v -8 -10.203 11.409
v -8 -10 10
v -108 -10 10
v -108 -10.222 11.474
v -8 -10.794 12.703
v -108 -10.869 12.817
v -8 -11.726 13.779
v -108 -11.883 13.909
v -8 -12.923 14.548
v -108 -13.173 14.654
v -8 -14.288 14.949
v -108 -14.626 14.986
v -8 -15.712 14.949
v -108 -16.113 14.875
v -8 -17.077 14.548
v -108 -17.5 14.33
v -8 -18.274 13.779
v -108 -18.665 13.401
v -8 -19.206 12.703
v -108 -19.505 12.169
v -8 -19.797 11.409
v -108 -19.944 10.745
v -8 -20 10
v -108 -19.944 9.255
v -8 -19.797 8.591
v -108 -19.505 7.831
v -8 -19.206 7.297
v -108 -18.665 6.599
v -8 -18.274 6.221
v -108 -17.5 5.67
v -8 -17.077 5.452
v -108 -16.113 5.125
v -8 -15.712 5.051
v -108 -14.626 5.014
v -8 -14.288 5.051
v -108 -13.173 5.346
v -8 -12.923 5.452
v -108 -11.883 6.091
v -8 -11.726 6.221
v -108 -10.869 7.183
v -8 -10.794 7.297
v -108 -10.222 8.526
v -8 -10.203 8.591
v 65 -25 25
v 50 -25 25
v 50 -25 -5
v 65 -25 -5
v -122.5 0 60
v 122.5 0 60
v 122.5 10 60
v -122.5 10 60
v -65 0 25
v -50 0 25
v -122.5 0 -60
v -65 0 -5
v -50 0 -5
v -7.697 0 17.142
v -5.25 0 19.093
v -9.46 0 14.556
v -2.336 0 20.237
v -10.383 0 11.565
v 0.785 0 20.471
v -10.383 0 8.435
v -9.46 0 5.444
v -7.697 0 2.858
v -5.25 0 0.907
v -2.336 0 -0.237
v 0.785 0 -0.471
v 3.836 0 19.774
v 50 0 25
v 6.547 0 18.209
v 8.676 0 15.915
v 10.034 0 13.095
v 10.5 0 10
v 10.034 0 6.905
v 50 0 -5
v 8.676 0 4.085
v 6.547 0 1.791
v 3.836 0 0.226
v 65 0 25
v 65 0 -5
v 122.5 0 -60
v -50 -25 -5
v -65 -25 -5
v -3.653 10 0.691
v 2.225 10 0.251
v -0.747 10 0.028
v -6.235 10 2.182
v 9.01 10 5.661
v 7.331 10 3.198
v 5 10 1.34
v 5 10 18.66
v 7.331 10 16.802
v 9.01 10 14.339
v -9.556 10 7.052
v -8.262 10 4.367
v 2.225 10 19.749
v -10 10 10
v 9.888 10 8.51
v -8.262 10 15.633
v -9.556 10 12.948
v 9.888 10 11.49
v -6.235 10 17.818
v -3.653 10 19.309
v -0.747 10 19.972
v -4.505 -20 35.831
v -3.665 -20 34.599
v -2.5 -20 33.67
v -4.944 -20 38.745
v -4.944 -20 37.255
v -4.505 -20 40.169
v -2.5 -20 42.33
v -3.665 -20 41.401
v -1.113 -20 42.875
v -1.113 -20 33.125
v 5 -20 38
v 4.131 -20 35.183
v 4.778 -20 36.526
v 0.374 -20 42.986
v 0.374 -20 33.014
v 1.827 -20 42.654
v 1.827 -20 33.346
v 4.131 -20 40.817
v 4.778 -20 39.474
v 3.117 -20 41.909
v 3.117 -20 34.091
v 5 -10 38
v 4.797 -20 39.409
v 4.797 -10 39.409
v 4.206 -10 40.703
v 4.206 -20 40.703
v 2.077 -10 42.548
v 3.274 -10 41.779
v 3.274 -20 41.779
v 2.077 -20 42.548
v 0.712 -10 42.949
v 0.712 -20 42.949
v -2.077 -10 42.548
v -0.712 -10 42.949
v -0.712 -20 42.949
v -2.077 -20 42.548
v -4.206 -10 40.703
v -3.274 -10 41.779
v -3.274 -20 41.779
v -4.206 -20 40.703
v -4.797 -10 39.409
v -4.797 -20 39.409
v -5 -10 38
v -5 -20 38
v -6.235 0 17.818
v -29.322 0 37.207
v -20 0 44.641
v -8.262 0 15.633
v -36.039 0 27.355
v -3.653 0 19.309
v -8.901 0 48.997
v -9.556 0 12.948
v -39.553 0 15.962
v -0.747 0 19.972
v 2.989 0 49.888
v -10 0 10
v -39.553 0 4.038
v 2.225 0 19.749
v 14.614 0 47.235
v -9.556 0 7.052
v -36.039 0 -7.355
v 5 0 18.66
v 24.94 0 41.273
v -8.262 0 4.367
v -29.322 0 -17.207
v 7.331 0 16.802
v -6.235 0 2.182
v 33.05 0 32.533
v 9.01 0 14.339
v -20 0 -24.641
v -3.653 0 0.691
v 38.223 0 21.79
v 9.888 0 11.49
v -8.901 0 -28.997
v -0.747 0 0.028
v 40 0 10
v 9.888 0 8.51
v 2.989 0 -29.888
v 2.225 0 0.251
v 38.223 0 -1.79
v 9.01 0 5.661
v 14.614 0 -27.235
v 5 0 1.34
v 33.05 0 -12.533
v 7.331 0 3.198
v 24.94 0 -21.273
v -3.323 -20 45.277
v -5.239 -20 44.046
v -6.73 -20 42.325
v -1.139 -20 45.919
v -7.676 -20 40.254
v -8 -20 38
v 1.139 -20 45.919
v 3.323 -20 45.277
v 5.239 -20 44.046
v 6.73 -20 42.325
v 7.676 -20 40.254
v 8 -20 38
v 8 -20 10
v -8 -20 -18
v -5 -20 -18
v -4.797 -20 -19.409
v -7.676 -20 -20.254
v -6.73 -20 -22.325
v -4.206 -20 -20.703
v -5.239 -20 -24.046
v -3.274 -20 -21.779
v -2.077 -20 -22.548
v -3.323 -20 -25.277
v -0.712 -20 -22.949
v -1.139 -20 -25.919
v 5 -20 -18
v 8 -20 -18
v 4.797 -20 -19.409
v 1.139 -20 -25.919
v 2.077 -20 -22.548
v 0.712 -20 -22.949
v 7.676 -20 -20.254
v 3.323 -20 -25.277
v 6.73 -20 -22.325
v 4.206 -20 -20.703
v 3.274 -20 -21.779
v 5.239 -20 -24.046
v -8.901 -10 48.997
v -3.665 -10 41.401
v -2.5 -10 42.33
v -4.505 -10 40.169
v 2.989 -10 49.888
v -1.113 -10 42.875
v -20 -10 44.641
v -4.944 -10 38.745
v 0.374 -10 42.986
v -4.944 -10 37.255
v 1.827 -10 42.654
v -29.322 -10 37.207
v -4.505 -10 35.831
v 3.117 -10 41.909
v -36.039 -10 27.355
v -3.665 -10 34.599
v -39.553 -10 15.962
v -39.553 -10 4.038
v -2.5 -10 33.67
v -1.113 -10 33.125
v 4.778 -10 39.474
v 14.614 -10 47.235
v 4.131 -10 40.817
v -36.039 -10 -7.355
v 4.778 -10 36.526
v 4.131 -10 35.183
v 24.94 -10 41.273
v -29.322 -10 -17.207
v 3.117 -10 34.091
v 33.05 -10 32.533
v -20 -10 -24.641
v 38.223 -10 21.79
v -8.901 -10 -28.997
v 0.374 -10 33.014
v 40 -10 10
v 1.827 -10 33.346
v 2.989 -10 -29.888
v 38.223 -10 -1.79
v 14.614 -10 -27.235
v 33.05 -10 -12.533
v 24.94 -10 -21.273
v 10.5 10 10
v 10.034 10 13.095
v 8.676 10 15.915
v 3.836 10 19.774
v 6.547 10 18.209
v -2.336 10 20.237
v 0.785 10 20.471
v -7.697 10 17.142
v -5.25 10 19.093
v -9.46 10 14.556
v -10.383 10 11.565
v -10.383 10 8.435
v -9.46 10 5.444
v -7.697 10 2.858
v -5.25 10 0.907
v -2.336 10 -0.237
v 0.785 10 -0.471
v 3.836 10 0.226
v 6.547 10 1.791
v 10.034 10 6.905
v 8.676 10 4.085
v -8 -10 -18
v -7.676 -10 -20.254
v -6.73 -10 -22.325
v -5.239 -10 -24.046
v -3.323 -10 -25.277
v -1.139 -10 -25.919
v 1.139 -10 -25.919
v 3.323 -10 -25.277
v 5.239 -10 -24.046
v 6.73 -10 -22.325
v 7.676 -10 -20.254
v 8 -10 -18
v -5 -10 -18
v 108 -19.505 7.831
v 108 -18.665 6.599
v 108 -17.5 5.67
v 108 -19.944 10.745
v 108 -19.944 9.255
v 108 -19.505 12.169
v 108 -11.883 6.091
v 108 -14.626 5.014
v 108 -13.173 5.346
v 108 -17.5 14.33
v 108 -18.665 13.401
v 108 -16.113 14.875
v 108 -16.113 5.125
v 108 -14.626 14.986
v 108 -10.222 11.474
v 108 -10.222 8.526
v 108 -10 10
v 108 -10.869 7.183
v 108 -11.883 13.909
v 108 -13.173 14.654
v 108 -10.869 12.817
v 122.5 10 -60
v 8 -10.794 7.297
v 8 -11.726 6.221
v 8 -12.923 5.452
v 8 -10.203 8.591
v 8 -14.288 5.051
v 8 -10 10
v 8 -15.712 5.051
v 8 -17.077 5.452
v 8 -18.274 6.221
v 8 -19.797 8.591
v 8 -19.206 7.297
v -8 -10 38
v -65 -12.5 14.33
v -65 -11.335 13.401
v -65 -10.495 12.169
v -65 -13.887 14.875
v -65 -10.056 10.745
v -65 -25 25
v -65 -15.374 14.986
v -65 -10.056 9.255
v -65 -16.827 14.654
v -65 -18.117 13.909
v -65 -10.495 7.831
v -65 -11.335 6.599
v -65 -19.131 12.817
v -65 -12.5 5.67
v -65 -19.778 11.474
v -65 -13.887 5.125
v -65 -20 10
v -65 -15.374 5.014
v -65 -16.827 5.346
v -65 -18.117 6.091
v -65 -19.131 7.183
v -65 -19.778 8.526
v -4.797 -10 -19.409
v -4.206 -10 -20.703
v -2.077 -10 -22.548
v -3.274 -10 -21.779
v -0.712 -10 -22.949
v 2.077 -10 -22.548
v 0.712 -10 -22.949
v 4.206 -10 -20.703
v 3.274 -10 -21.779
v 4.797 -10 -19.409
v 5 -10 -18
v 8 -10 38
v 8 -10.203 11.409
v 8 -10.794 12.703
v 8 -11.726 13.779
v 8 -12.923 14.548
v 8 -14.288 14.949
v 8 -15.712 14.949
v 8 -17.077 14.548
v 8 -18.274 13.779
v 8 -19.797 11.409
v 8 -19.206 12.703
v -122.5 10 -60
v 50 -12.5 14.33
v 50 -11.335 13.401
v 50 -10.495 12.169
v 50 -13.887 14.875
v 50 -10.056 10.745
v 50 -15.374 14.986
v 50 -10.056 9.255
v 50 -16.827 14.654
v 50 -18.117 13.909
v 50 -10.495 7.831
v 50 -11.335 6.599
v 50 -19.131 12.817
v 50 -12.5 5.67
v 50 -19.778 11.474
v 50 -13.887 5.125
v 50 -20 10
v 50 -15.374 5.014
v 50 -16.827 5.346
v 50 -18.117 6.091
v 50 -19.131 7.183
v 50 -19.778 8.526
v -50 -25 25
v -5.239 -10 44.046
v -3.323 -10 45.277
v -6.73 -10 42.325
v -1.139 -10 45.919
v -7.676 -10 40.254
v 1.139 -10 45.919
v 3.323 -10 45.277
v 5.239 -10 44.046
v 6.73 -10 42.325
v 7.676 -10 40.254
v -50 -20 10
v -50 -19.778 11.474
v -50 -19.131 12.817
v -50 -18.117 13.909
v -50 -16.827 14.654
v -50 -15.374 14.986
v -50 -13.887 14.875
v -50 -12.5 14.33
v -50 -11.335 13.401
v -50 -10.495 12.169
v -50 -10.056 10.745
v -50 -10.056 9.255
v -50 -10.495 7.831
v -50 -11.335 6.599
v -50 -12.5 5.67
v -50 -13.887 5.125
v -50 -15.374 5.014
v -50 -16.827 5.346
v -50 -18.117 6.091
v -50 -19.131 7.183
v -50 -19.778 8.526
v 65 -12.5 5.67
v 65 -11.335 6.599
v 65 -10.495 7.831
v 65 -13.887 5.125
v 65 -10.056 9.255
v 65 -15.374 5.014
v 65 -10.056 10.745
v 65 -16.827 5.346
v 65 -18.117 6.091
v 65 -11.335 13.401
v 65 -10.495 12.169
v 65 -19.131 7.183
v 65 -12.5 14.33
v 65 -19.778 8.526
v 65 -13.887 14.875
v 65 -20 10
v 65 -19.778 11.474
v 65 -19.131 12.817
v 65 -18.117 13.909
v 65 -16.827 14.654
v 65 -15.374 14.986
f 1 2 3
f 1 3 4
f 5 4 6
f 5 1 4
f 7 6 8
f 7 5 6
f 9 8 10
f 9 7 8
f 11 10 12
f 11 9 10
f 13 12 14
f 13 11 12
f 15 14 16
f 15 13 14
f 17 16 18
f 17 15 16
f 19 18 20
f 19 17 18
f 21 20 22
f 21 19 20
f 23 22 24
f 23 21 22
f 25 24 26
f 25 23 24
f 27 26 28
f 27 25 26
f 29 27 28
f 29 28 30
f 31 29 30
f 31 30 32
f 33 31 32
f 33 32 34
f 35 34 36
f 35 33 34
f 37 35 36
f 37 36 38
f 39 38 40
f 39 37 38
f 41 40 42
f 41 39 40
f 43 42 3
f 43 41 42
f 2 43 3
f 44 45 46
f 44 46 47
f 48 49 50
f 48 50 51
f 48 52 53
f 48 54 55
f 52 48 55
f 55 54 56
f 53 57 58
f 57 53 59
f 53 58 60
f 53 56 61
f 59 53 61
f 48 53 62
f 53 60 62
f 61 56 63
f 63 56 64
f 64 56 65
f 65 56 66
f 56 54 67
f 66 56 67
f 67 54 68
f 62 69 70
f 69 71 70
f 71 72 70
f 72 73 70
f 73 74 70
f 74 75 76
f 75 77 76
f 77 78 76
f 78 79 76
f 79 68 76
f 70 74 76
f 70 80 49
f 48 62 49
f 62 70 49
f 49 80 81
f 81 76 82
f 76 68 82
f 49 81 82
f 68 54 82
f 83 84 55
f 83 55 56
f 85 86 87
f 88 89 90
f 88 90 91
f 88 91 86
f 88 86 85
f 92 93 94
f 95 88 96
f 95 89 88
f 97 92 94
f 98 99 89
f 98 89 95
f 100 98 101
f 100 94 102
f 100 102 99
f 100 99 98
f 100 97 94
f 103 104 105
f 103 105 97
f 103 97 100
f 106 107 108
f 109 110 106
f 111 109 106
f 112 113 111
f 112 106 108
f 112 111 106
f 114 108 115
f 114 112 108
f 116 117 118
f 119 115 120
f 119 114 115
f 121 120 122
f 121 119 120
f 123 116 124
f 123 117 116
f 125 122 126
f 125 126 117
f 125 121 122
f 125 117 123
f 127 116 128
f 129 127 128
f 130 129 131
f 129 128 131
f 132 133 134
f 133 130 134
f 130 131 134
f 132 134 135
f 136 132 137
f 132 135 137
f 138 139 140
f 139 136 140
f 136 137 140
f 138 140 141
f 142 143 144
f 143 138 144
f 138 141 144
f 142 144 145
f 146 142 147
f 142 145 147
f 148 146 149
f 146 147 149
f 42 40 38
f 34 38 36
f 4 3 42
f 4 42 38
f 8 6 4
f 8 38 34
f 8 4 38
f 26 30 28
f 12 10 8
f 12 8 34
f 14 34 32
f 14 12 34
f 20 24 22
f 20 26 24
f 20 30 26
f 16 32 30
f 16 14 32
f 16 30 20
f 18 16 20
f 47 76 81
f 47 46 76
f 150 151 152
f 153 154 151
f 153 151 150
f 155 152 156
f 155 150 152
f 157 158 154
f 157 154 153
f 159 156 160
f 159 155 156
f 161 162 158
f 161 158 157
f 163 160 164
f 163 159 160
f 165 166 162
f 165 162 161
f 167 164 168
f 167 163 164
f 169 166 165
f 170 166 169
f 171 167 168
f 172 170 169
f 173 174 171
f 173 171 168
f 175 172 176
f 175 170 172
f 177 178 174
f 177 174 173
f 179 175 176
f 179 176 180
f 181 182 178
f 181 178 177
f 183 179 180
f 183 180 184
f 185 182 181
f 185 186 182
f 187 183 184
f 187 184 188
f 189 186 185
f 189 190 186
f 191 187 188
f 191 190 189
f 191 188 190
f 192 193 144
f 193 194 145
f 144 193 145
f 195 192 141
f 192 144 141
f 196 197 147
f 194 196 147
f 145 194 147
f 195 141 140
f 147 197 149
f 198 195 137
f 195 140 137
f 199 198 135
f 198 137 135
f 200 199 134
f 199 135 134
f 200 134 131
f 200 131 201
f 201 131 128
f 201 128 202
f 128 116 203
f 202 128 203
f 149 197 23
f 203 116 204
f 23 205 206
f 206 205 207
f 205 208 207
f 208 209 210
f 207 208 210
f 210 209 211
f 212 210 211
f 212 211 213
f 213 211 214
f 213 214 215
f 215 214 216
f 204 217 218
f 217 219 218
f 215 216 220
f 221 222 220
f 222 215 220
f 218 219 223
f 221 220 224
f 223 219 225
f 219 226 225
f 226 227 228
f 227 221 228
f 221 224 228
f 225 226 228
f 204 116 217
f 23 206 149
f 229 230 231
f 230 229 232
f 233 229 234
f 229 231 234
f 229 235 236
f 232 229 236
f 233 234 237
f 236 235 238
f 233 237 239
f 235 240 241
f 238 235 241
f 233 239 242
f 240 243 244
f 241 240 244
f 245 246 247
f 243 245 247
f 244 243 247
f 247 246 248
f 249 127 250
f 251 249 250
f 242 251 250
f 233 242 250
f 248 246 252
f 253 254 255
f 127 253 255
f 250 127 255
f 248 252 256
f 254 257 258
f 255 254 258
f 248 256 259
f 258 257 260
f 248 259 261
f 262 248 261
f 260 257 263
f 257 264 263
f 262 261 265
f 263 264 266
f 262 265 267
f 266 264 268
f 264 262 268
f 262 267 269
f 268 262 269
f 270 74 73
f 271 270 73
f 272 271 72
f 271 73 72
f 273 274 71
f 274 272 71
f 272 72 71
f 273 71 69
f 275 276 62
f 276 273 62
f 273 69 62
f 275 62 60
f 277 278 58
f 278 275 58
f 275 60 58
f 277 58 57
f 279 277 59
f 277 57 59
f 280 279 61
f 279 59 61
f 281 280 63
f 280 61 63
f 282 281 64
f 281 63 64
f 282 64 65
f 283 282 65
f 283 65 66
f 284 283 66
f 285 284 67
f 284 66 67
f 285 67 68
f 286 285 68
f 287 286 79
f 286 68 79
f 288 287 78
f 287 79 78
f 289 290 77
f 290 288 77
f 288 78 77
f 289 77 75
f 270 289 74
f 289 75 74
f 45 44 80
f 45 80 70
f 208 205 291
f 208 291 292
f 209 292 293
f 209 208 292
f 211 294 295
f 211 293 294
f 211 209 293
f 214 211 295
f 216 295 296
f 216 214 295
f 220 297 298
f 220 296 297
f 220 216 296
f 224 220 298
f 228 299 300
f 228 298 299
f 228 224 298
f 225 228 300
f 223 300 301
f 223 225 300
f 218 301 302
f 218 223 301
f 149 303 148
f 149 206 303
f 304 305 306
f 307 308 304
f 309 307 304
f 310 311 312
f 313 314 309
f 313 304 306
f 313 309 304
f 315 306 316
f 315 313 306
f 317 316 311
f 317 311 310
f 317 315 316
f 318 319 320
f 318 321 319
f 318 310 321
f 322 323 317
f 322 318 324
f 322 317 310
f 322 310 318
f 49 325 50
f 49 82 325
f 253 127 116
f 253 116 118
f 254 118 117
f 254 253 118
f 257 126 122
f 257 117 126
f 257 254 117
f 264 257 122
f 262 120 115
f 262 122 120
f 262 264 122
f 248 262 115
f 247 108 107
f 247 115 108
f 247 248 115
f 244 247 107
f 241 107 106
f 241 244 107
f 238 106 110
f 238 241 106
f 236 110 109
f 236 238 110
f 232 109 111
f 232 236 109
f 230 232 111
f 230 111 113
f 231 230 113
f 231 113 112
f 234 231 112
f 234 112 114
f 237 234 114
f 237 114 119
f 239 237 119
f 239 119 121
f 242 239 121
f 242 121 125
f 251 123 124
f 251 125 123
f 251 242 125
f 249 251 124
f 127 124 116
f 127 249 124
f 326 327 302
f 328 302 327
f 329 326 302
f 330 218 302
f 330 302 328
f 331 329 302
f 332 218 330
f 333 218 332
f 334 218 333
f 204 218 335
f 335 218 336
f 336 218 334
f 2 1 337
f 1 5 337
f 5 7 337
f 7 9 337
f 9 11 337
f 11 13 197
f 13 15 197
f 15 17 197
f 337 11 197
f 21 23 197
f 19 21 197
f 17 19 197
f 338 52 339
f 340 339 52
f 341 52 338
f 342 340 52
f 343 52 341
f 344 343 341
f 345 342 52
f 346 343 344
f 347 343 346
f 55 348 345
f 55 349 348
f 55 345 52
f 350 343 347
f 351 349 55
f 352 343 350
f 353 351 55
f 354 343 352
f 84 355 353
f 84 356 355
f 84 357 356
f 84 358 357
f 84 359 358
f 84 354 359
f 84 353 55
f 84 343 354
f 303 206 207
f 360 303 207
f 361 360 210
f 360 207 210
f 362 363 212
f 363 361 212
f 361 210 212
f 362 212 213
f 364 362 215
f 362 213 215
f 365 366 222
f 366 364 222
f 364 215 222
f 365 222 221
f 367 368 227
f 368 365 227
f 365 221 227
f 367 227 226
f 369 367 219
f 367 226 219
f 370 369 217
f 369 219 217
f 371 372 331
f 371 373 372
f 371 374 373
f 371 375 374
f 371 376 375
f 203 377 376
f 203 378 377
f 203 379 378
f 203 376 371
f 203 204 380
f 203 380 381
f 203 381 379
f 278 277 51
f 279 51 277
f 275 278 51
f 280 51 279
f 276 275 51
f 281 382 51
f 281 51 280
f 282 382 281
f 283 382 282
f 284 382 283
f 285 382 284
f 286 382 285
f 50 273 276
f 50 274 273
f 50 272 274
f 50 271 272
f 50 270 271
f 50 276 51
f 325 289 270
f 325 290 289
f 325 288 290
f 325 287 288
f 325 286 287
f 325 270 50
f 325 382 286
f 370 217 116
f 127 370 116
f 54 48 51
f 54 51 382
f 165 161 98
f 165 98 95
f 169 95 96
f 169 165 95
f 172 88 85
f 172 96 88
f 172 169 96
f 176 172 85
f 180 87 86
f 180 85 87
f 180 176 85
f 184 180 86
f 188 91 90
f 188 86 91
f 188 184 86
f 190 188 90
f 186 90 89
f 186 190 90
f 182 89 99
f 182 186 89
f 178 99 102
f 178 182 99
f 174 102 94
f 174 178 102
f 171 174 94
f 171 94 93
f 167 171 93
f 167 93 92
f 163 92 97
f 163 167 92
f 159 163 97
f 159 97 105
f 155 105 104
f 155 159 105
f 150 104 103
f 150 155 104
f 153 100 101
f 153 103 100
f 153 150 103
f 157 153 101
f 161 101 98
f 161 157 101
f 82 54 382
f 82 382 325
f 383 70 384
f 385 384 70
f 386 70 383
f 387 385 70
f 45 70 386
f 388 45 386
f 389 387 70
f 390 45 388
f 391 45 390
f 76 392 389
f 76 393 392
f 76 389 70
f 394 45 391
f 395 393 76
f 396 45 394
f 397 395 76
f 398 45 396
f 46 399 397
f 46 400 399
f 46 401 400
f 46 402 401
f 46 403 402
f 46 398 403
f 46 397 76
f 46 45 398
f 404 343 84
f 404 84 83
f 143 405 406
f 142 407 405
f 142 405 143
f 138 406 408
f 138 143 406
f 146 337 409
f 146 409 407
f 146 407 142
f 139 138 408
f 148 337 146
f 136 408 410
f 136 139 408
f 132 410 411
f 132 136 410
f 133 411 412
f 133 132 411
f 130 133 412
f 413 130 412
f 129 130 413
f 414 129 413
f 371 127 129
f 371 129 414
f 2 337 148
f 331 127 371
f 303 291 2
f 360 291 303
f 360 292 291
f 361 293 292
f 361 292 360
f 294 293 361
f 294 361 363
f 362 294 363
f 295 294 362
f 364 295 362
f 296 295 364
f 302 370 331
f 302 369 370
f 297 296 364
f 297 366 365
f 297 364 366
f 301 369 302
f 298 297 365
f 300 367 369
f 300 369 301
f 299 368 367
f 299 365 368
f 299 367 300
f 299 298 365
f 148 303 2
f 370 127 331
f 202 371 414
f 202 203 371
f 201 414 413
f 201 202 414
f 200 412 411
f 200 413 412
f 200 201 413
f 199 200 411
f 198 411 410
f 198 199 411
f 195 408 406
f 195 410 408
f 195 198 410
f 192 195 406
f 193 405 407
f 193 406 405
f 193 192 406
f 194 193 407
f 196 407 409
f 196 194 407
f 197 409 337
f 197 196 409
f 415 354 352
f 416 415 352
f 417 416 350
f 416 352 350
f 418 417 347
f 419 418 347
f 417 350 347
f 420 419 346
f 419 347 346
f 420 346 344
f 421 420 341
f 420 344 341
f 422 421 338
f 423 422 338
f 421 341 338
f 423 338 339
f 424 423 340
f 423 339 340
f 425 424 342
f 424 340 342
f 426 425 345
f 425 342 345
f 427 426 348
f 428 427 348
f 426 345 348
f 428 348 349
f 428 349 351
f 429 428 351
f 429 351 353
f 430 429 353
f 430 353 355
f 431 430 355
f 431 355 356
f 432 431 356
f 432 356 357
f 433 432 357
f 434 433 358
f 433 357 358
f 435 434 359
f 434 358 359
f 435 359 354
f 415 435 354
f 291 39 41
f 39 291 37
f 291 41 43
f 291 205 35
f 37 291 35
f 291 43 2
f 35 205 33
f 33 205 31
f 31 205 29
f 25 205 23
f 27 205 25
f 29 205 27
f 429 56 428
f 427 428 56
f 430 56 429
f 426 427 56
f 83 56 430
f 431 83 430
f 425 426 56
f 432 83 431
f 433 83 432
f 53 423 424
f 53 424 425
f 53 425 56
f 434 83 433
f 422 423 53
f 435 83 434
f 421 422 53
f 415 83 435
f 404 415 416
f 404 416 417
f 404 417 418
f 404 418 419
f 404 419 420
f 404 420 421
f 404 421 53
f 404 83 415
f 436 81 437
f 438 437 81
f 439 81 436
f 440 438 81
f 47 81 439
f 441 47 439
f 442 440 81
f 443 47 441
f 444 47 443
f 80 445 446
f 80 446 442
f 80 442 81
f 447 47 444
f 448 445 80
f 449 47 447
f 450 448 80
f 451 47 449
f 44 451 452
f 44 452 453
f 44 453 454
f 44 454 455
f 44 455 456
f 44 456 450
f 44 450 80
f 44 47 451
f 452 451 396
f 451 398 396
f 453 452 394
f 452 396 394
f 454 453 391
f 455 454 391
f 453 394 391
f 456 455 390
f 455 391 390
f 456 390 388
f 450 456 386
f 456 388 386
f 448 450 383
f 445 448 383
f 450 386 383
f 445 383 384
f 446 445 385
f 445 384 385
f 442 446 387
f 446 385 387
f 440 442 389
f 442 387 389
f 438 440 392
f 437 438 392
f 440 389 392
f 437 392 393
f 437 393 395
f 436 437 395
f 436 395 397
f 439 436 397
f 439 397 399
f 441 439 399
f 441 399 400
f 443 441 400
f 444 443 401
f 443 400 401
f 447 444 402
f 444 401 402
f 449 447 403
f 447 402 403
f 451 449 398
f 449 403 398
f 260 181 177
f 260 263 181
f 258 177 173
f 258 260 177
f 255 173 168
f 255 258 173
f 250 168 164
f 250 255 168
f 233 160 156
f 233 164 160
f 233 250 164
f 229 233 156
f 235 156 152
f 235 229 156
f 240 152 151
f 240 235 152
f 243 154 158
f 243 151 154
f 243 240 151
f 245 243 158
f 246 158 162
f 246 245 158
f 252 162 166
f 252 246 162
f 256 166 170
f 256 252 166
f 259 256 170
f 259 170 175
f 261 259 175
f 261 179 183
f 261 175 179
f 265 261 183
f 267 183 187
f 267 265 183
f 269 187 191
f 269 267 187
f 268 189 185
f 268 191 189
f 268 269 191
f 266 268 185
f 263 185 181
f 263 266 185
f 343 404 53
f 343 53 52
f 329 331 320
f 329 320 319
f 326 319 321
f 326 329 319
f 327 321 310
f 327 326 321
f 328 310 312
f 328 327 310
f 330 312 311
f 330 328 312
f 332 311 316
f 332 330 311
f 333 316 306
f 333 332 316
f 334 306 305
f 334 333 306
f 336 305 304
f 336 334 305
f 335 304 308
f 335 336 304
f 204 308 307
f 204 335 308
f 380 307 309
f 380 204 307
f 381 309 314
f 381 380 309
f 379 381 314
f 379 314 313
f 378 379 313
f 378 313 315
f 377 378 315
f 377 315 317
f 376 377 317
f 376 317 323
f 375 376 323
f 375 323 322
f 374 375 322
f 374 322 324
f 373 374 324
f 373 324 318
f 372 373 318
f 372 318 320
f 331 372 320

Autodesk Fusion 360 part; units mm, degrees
sketch "Sketch1" plane through (0, 0, 0) normal (0, 1, 0) x (1, 0, 0)
  line L0 (122.5, -60) -> (-122.5, -60)
  line L1 (-122.5, -60) -> (-122.5, 60)
  line L2 (-122.5, 60) -> (122.5, 60)
  line L3 (122.5, 60) -> (122.5, -60)
  line L4 (122.5, -60) -> (-122.5, 60) construction
  line L5 (-122.5, -60) -> (122.5, 60) construction
  line L6 (-50, -25) -> (-65, -25)
  line L7 (-65, -25) -> (-65, 5)
  line L8 (-65, 5) -> (-50, 5)
  line L9 (-50, 5) -> (-50, -25)
  line L10 (-50, -25) -> (-65, 5) construction
  line L11 (-65, -25) -> (-50, 5) construction
  line L12 (65, -25) -> (50, -25)
  line L13 (50, -25) -> (50, 5)
  line L14 (50, 5) -> (65, 5)
  line L15 (65, 5) -> (65, -25)
  line L16 (65, -25) -> (50, 5) construction
  line L17 (50, -25) -> (65, 5) construction
  circle A0 centre (0, -10) radius 10.5
  point P0 (-57.5, -10)
  point P1 (57.5, -10)
  dimension "d1" = 245
  dimension "d2" = 120
  dimension "d3" = 15
  dimension "d4" = 30
  dimension "d5" = 15
  dimension "d6" = 30
  dimension "d7" = 55
  dimension "d8" = 30
  dimension "d9" = 100
  dimension "d10" = 50
  dimension "d11" = 21
  dimension "d12" = 21
  dimension "d13" = 10
extrude "Extrude1" add sketch "Sketch1" along normal blind 10 makes body 1
extrude "Extrude2" add sketch "Sketch1" along normal blind 10 and the other way blind 25 contours L6 L7 L8 L9 | L12 L13 L14 L15 bodies 1
sketch "Sketch2" plane through (-65, 0, 0) normal (-1, 0, 0) x (0, -1, 0)
  line L0 (0, 25) -> (0, -5)
  line L1 (0, -5) -> (25, -5)
  line L2 (25, -5) -> (25, 25)
  line L3 (25, 25) -> (0, 25)
  circle A0 centre (15, 10) radius 5
  line L4 (0, 60) -> (0, -60)
  dimension "d20" = 10
  dimension "d21" = 15
  dimension "d22" = 15
extrude "Extrude3" cut sketch "Sketch2" against normal through all contours A0 bodies 1
copy_body "Body->Comp1" bodies 1 removing the originals makes body 2 in component "Base"
sketch "Sketch3" plane through (0, 0, 0) normal (0, 1, 0) x (1, 0, 0)
  line L0 (144.9958, -110.0049) -> (144.9958, -166.0049)
  line L1 (154.9958, -110.0049) -> (154.9958, -166.0049)
  arc A0 (144.9958, -166.0049) -> (154.9958, -166.0049) centre (149.9958, -166.0049) ccw
  arc A1 (154.9958, -110.0049) -> (144.9958, -110.0049) centre (149.9958, -110.0049) ccw
  arc A2 (141.9958, -166.0049) -> (157.9958, -166.0049) centre (149.9958, -166.0049) ccw
  line L2 (157.9958, -110.0049) -> (157.9958, -166.0049)
  arc A3 (157.9958, -110.0049) -> (141.9958, -110.0049) centre (149.9958, -110.0049) ccw
  line L3 (141.9958, -110.0049) -> (141.9958, -166.0049)
  dimension "d24" = 10
  dimension "d25" = 10
  dimension "d26" = 56
  dimension "d27" = -3
extrude "Extrude4" add sketch "Sketch3" along normal blind 10 separate body makes body 3
sketch "Sketch4" plane through (157.9958, 0, 0) normal (1, 0, 0) x (0, 1, 0)
  line L0 (0, 166.0049) -> (0, 110.0049)
  line L1 (0, 110.0049) -> (10, 110.0049)
  line L2 (10, 110.0049) -> (10, 166.0049)
  line L3 (10, 166.0049) -> (0, 166.0049)
  circle A0 centre (5, 138.0049) radius 5
  dimension "d30" = 10
  dimension "d31" = 28
  dimension "d32" = 5
extrude "Extrude5" add sketch "Sketch4" along normal blind 100 contours A0 bodies 3
ref_plane "WorkPlane1" through (149.9958, 5, 138.0049) normal (1, 0, 0) x (0, 0, -1)
mirror "Mirror1" about plane through (149.9958, 5, 138.0049) normal (1, 0, 0) of "Extrude5"
copy_body "Body->Comp2" bodies 3 removing the originals makes body 4 in component "Sliding Pair"
sketch "Sketch5" plane through (0, 0, 0) normal (0, 1, 0) x (1, 0, 0)
  circle A0 centre (-192.7727, -130.3001) radius 40
  dimension "d37" = 80
extrude "Extrude6" add sketch "Sketch5" along normal blind 10 separate body makes body 5
sketch "Sketch6" plane through (0, 0, 0) normal (0, -1, 0) x (1, 0, 0)
  circle A0 centre (-192.7727, 130.3001) radius 40
  circle A1 centre (-192.7727, 158.3001) radius 5
  dimension "d40" = 10
  dimension "d41" = 28
extrude "Extrude7" add sketch "Sketch6" along normal blind 10 contours A1 bodies 5
sketch "Sketch7" plane through (0, 10, 0) normal (0, 1, 0) x (-1, 0, 0)
  circle A0 centre (192.7727, 130.3001) radius 40
  circle A1 centre (192.7727, 130.3001) radius 10
  dimension "d44" = 20
extrude "Extrude8" add sketch "Sketch7" along normal blind 10 contours A1 bodies 5
copy_body "Body->Comp3" bodies 5 removing the originals makes body 6 in component "Component"
component "Base" placed x (1, 0, 0) y (0, 1, 0) z (0, 0, 1) at (0, 0, 0)
component "Sliding Pair" placed x (1, 0, 0) y (0, 1, 0) z (0, 0, 1) at (-149.9958, -20, -128.0049)
component "Component" placed x (1, 0, 0) y (0, 1, 0) z (0, 0, 1) at (192.7727, -10, -120.3001)
equation "d7 = 120 mm - 35 mm - 30 mm"
